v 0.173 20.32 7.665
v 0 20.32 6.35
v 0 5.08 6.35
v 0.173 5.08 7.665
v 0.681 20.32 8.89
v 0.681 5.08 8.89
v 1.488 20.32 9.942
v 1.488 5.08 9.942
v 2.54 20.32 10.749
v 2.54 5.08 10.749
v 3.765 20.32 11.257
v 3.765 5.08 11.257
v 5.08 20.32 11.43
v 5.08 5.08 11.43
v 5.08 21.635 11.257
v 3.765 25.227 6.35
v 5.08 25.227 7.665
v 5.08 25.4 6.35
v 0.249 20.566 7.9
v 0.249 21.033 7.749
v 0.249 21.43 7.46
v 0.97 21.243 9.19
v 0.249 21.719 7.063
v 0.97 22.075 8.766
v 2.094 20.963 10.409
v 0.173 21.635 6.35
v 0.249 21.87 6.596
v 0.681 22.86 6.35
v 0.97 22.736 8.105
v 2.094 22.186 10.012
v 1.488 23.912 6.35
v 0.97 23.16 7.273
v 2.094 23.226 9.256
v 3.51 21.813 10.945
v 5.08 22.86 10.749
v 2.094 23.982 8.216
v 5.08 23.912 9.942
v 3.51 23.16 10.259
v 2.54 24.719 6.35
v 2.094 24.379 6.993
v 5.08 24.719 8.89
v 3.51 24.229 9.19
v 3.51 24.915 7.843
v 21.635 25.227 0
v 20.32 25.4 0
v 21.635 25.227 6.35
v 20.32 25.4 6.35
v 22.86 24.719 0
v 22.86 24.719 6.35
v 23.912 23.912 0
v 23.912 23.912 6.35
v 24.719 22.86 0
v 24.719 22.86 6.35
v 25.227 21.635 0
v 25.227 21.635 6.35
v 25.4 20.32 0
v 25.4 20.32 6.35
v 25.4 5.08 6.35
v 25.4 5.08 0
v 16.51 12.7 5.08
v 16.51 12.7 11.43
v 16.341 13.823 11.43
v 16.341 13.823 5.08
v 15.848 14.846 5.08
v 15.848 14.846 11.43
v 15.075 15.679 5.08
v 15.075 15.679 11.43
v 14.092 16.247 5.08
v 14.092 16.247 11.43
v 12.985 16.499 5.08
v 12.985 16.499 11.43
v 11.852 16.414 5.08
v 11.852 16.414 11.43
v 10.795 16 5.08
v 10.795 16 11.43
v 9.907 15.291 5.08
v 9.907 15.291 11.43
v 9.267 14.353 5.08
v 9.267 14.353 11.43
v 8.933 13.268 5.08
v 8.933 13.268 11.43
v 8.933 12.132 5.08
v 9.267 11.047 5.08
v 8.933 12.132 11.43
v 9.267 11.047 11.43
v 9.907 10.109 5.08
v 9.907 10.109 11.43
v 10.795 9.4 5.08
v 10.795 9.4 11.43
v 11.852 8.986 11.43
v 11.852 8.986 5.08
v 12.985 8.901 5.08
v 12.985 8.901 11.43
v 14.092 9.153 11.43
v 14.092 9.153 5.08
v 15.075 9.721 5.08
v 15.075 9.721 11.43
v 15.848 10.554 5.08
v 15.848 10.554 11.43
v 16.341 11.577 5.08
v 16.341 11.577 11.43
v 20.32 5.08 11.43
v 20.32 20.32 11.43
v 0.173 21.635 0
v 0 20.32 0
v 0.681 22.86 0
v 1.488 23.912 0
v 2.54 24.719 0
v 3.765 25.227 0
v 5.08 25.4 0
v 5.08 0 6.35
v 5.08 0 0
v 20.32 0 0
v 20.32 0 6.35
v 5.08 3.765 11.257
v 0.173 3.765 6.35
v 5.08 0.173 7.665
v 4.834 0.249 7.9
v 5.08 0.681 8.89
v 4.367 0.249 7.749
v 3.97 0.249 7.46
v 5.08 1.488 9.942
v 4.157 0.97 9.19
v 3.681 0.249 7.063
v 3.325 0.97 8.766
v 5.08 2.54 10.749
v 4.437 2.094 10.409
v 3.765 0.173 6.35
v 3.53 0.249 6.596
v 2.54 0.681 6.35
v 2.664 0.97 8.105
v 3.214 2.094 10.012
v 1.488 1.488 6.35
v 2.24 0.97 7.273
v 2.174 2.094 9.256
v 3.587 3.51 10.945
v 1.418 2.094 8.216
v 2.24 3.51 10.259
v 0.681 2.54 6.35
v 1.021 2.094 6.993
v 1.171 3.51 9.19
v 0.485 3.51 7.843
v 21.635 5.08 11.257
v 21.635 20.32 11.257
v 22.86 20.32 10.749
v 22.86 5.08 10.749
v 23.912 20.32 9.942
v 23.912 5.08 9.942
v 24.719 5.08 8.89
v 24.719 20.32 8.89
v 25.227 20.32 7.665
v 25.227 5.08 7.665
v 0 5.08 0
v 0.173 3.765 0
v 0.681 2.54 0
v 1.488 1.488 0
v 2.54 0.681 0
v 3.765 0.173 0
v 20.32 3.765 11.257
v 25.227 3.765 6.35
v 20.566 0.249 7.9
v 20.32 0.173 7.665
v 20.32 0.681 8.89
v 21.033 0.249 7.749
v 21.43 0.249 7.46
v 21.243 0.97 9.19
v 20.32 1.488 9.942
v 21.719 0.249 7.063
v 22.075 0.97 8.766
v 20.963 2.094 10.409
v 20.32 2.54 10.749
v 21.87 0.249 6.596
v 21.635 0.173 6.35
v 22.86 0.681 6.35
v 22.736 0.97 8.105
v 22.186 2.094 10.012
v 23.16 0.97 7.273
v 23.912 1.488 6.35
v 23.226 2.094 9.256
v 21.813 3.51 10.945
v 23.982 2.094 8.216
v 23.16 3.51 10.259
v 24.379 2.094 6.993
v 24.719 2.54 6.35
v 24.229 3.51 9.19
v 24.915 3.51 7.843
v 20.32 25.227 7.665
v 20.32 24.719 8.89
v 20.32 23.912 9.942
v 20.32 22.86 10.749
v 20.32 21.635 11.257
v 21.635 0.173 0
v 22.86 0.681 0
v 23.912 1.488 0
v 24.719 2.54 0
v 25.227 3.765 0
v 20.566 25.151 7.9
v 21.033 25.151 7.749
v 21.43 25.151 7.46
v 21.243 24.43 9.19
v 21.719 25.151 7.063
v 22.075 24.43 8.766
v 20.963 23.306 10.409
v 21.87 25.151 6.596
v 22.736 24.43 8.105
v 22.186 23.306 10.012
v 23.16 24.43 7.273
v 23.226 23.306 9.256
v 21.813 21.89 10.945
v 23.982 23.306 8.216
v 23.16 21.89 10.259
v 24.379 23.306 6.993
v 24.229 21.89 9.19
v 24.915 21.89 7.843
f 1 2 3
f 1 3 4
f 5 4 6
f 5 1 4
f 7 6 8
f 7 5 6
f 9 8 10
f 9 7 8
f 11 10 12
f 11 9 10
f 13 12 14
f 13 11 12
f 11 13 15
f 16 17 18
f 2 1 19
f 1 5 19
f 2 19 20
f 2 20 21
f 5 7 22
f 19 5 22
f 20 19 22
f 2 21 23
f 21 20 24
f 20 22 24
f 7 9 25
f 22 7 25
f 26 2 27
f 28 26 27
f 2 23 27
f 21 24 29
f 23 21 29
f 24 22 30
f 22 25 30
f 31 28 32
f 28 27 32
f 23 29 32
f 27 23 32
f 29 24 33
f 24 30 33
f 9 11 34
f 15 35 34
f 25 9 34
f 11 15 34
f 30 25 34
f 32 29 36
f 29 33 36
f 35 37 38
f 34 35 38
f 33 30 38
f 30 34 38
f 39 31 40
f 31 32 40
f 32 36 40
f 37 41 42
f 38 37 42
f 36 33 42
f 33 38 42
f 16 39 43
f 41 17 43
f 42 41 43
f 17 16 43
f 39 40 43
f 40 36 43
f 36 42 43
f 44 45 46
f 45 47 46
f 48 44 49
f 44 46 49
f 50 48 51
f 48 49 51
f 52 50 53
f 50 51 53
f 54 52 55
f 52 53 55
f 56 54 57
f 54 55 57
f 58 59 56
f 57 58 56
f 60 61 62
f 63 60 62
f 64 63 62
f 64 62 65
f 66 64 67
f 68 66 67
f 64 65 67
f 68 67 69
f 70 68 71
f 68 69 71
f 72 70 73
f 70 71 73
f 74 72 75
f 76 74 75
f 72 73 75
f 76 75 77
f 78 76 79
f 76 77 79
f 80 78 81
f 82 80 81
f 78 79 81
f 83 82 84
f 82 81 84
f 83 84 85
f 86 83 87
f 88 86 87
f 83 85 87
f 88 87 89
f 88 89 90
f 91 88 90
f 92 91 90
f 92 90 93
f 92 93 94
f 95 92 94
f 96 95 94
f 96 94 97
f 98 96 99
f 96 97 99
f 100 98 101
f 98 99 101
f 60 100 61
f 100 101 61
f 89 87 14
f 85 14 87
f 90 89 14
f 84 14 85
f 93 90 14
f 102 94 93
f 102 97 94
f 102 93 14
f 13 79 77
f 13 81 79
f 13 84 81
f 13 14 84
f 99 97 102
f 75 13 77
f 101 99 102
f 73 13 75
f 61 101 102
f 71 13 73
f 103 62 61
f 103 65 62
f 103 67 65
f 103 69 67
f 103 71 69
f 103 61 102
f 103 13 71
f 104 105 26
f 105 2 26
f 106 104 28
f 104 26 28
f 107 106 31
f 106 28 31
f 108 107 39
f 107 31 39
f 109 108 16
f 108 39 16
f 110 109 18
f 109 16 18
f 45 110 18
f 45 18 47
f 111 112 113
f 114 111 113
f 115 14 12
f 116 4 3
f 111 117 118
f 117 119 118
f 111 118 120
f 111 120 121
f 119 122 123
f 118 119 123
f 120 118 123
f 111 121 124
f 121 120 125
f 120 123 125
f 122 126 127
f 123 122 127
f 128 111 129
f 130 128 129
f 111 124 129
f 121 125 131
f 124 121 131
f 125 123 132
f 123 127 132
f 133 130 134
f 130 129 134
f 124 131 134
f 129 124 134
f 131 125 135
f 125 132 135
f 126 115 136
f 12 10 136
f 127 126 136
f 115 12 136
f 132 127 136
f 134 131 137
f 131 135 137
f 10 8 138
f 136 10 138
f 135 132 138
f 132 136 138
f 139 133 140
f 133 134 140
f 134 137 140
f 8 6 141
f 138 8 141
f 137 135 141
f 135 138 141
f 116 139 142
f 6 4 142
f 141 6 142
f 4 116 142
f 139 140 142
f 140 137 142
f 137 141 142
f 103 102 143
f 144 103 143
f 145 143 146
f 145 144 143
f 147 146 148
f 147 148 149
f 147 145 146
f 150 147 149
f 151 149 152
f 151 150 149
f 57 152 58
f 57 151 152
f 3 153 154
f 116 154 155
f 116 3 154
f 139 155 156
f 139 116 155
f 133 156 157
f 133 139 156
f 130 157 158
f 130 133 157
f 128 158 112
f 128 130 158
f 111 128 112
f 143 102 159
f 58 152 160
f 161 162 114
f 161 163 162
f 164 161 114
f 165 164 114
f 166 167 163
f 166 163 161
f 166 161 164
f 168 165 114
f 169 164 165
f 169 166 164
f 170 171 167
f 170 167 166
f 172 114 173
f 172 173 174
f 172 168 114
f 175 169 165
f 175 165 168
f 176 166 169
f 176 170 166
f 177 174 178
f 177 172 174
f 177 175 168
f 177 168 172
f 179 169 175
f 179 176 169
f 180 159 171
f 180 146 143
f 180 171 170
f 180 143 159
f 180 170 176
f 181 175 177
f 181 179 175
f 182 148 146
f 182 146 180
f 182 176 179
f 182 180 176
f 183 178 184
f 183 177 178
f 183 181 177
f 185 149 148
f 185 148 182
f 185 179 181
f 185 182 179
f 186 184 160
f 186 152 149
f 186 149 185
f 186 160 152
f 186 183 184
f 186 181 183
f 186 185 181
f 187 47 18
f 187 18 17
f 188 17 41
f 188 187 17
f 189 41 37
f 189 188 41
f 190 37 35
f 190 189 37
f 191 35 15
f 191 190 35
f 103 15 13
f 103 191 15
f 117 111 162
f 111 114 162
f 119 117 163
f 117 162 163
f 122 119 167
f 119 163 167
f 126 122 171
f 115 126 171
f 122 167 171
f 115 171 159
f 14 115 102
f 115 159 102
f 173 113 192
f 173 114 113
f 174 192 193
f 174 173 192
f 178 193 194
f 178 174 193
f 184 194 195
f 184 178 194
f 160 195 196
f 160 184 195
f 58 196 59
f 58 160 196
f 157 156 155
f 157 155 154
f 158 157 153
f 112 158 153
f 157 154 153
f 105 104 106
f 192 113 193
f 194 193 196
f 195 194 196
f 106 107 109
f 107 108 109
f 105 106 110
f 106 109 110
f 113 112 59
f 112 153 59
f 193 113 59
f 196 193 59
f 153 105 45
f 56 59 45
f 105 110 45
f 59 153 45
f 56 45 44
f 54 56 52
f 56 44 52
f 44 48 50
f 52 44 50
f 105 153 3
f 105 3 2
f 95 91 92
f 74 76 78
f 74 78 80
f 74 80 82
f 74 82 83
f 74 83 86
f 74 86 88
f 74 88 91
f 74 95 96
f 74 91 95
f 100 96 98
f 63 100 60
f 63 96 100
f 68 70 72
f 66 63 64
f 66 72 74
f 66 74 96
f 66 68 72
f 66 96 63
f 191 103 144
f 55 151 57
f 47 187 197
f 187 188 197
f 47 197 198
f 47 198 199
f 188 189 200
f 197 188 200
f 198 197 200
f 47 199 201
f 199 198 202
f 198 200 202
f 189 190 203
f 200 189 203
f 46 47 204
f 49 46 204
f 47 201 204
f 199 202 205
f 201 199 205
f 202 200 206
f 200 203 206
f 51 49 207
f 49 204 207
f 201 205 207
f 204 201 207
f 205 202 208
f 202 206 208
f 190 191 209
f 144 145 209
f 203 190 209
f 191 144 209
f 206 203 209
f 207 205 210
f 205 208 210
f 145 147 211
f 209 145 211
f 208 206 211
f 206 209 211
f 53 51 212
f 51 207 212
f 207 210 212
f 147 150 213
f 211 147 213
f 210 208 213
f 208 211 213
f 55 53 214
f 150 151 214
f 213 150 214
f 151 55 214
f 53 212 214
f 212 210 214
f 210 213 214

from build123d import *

# Parameters (mm, degrees)
F0_W     = 25.4
F0_H     = 25.4
F1_DEPTH = 11.43
F2_R     = 3.81
F3_DEPTH = 6.35
F4_R     = 5.08


with BuildPart() as f1:
    # F0 (on Top) → F1 (new body)
    with BuildSketch(Plane.XY):
        with Locations((12.7, 12.7)):
            Rectangle(F0_W, F0_H)
    extrude(amount=F1_DEPTH)

    # F2 (on face) → F3 (cut)
    with BuildSketch(Plane.XY.offset(11.43)):
        with Locations((12.7, 12.7)):
            Circle(F2_R)
    extrude(amount=-F3_DEPTH, mode=Mode.SUBTRACT)

    # F4
    f4_edges = [f1.edges().sort_by_distance(p)[0] for p in [
        (25.4, 12.7, 11.43),
        (12.7, 25.4, 11.43),
        (0, 12.7, 11.43),
        (12.7, 0, 11.43),
        (25.4, 25.4, 5.715),
        (25.4, 0, 5.715),
        (0, 25.4, 5.715),
        (0, 0, 5.715),
    ]]
    fillet(f4_edges, radius=F4_R)


solid = f1.part
